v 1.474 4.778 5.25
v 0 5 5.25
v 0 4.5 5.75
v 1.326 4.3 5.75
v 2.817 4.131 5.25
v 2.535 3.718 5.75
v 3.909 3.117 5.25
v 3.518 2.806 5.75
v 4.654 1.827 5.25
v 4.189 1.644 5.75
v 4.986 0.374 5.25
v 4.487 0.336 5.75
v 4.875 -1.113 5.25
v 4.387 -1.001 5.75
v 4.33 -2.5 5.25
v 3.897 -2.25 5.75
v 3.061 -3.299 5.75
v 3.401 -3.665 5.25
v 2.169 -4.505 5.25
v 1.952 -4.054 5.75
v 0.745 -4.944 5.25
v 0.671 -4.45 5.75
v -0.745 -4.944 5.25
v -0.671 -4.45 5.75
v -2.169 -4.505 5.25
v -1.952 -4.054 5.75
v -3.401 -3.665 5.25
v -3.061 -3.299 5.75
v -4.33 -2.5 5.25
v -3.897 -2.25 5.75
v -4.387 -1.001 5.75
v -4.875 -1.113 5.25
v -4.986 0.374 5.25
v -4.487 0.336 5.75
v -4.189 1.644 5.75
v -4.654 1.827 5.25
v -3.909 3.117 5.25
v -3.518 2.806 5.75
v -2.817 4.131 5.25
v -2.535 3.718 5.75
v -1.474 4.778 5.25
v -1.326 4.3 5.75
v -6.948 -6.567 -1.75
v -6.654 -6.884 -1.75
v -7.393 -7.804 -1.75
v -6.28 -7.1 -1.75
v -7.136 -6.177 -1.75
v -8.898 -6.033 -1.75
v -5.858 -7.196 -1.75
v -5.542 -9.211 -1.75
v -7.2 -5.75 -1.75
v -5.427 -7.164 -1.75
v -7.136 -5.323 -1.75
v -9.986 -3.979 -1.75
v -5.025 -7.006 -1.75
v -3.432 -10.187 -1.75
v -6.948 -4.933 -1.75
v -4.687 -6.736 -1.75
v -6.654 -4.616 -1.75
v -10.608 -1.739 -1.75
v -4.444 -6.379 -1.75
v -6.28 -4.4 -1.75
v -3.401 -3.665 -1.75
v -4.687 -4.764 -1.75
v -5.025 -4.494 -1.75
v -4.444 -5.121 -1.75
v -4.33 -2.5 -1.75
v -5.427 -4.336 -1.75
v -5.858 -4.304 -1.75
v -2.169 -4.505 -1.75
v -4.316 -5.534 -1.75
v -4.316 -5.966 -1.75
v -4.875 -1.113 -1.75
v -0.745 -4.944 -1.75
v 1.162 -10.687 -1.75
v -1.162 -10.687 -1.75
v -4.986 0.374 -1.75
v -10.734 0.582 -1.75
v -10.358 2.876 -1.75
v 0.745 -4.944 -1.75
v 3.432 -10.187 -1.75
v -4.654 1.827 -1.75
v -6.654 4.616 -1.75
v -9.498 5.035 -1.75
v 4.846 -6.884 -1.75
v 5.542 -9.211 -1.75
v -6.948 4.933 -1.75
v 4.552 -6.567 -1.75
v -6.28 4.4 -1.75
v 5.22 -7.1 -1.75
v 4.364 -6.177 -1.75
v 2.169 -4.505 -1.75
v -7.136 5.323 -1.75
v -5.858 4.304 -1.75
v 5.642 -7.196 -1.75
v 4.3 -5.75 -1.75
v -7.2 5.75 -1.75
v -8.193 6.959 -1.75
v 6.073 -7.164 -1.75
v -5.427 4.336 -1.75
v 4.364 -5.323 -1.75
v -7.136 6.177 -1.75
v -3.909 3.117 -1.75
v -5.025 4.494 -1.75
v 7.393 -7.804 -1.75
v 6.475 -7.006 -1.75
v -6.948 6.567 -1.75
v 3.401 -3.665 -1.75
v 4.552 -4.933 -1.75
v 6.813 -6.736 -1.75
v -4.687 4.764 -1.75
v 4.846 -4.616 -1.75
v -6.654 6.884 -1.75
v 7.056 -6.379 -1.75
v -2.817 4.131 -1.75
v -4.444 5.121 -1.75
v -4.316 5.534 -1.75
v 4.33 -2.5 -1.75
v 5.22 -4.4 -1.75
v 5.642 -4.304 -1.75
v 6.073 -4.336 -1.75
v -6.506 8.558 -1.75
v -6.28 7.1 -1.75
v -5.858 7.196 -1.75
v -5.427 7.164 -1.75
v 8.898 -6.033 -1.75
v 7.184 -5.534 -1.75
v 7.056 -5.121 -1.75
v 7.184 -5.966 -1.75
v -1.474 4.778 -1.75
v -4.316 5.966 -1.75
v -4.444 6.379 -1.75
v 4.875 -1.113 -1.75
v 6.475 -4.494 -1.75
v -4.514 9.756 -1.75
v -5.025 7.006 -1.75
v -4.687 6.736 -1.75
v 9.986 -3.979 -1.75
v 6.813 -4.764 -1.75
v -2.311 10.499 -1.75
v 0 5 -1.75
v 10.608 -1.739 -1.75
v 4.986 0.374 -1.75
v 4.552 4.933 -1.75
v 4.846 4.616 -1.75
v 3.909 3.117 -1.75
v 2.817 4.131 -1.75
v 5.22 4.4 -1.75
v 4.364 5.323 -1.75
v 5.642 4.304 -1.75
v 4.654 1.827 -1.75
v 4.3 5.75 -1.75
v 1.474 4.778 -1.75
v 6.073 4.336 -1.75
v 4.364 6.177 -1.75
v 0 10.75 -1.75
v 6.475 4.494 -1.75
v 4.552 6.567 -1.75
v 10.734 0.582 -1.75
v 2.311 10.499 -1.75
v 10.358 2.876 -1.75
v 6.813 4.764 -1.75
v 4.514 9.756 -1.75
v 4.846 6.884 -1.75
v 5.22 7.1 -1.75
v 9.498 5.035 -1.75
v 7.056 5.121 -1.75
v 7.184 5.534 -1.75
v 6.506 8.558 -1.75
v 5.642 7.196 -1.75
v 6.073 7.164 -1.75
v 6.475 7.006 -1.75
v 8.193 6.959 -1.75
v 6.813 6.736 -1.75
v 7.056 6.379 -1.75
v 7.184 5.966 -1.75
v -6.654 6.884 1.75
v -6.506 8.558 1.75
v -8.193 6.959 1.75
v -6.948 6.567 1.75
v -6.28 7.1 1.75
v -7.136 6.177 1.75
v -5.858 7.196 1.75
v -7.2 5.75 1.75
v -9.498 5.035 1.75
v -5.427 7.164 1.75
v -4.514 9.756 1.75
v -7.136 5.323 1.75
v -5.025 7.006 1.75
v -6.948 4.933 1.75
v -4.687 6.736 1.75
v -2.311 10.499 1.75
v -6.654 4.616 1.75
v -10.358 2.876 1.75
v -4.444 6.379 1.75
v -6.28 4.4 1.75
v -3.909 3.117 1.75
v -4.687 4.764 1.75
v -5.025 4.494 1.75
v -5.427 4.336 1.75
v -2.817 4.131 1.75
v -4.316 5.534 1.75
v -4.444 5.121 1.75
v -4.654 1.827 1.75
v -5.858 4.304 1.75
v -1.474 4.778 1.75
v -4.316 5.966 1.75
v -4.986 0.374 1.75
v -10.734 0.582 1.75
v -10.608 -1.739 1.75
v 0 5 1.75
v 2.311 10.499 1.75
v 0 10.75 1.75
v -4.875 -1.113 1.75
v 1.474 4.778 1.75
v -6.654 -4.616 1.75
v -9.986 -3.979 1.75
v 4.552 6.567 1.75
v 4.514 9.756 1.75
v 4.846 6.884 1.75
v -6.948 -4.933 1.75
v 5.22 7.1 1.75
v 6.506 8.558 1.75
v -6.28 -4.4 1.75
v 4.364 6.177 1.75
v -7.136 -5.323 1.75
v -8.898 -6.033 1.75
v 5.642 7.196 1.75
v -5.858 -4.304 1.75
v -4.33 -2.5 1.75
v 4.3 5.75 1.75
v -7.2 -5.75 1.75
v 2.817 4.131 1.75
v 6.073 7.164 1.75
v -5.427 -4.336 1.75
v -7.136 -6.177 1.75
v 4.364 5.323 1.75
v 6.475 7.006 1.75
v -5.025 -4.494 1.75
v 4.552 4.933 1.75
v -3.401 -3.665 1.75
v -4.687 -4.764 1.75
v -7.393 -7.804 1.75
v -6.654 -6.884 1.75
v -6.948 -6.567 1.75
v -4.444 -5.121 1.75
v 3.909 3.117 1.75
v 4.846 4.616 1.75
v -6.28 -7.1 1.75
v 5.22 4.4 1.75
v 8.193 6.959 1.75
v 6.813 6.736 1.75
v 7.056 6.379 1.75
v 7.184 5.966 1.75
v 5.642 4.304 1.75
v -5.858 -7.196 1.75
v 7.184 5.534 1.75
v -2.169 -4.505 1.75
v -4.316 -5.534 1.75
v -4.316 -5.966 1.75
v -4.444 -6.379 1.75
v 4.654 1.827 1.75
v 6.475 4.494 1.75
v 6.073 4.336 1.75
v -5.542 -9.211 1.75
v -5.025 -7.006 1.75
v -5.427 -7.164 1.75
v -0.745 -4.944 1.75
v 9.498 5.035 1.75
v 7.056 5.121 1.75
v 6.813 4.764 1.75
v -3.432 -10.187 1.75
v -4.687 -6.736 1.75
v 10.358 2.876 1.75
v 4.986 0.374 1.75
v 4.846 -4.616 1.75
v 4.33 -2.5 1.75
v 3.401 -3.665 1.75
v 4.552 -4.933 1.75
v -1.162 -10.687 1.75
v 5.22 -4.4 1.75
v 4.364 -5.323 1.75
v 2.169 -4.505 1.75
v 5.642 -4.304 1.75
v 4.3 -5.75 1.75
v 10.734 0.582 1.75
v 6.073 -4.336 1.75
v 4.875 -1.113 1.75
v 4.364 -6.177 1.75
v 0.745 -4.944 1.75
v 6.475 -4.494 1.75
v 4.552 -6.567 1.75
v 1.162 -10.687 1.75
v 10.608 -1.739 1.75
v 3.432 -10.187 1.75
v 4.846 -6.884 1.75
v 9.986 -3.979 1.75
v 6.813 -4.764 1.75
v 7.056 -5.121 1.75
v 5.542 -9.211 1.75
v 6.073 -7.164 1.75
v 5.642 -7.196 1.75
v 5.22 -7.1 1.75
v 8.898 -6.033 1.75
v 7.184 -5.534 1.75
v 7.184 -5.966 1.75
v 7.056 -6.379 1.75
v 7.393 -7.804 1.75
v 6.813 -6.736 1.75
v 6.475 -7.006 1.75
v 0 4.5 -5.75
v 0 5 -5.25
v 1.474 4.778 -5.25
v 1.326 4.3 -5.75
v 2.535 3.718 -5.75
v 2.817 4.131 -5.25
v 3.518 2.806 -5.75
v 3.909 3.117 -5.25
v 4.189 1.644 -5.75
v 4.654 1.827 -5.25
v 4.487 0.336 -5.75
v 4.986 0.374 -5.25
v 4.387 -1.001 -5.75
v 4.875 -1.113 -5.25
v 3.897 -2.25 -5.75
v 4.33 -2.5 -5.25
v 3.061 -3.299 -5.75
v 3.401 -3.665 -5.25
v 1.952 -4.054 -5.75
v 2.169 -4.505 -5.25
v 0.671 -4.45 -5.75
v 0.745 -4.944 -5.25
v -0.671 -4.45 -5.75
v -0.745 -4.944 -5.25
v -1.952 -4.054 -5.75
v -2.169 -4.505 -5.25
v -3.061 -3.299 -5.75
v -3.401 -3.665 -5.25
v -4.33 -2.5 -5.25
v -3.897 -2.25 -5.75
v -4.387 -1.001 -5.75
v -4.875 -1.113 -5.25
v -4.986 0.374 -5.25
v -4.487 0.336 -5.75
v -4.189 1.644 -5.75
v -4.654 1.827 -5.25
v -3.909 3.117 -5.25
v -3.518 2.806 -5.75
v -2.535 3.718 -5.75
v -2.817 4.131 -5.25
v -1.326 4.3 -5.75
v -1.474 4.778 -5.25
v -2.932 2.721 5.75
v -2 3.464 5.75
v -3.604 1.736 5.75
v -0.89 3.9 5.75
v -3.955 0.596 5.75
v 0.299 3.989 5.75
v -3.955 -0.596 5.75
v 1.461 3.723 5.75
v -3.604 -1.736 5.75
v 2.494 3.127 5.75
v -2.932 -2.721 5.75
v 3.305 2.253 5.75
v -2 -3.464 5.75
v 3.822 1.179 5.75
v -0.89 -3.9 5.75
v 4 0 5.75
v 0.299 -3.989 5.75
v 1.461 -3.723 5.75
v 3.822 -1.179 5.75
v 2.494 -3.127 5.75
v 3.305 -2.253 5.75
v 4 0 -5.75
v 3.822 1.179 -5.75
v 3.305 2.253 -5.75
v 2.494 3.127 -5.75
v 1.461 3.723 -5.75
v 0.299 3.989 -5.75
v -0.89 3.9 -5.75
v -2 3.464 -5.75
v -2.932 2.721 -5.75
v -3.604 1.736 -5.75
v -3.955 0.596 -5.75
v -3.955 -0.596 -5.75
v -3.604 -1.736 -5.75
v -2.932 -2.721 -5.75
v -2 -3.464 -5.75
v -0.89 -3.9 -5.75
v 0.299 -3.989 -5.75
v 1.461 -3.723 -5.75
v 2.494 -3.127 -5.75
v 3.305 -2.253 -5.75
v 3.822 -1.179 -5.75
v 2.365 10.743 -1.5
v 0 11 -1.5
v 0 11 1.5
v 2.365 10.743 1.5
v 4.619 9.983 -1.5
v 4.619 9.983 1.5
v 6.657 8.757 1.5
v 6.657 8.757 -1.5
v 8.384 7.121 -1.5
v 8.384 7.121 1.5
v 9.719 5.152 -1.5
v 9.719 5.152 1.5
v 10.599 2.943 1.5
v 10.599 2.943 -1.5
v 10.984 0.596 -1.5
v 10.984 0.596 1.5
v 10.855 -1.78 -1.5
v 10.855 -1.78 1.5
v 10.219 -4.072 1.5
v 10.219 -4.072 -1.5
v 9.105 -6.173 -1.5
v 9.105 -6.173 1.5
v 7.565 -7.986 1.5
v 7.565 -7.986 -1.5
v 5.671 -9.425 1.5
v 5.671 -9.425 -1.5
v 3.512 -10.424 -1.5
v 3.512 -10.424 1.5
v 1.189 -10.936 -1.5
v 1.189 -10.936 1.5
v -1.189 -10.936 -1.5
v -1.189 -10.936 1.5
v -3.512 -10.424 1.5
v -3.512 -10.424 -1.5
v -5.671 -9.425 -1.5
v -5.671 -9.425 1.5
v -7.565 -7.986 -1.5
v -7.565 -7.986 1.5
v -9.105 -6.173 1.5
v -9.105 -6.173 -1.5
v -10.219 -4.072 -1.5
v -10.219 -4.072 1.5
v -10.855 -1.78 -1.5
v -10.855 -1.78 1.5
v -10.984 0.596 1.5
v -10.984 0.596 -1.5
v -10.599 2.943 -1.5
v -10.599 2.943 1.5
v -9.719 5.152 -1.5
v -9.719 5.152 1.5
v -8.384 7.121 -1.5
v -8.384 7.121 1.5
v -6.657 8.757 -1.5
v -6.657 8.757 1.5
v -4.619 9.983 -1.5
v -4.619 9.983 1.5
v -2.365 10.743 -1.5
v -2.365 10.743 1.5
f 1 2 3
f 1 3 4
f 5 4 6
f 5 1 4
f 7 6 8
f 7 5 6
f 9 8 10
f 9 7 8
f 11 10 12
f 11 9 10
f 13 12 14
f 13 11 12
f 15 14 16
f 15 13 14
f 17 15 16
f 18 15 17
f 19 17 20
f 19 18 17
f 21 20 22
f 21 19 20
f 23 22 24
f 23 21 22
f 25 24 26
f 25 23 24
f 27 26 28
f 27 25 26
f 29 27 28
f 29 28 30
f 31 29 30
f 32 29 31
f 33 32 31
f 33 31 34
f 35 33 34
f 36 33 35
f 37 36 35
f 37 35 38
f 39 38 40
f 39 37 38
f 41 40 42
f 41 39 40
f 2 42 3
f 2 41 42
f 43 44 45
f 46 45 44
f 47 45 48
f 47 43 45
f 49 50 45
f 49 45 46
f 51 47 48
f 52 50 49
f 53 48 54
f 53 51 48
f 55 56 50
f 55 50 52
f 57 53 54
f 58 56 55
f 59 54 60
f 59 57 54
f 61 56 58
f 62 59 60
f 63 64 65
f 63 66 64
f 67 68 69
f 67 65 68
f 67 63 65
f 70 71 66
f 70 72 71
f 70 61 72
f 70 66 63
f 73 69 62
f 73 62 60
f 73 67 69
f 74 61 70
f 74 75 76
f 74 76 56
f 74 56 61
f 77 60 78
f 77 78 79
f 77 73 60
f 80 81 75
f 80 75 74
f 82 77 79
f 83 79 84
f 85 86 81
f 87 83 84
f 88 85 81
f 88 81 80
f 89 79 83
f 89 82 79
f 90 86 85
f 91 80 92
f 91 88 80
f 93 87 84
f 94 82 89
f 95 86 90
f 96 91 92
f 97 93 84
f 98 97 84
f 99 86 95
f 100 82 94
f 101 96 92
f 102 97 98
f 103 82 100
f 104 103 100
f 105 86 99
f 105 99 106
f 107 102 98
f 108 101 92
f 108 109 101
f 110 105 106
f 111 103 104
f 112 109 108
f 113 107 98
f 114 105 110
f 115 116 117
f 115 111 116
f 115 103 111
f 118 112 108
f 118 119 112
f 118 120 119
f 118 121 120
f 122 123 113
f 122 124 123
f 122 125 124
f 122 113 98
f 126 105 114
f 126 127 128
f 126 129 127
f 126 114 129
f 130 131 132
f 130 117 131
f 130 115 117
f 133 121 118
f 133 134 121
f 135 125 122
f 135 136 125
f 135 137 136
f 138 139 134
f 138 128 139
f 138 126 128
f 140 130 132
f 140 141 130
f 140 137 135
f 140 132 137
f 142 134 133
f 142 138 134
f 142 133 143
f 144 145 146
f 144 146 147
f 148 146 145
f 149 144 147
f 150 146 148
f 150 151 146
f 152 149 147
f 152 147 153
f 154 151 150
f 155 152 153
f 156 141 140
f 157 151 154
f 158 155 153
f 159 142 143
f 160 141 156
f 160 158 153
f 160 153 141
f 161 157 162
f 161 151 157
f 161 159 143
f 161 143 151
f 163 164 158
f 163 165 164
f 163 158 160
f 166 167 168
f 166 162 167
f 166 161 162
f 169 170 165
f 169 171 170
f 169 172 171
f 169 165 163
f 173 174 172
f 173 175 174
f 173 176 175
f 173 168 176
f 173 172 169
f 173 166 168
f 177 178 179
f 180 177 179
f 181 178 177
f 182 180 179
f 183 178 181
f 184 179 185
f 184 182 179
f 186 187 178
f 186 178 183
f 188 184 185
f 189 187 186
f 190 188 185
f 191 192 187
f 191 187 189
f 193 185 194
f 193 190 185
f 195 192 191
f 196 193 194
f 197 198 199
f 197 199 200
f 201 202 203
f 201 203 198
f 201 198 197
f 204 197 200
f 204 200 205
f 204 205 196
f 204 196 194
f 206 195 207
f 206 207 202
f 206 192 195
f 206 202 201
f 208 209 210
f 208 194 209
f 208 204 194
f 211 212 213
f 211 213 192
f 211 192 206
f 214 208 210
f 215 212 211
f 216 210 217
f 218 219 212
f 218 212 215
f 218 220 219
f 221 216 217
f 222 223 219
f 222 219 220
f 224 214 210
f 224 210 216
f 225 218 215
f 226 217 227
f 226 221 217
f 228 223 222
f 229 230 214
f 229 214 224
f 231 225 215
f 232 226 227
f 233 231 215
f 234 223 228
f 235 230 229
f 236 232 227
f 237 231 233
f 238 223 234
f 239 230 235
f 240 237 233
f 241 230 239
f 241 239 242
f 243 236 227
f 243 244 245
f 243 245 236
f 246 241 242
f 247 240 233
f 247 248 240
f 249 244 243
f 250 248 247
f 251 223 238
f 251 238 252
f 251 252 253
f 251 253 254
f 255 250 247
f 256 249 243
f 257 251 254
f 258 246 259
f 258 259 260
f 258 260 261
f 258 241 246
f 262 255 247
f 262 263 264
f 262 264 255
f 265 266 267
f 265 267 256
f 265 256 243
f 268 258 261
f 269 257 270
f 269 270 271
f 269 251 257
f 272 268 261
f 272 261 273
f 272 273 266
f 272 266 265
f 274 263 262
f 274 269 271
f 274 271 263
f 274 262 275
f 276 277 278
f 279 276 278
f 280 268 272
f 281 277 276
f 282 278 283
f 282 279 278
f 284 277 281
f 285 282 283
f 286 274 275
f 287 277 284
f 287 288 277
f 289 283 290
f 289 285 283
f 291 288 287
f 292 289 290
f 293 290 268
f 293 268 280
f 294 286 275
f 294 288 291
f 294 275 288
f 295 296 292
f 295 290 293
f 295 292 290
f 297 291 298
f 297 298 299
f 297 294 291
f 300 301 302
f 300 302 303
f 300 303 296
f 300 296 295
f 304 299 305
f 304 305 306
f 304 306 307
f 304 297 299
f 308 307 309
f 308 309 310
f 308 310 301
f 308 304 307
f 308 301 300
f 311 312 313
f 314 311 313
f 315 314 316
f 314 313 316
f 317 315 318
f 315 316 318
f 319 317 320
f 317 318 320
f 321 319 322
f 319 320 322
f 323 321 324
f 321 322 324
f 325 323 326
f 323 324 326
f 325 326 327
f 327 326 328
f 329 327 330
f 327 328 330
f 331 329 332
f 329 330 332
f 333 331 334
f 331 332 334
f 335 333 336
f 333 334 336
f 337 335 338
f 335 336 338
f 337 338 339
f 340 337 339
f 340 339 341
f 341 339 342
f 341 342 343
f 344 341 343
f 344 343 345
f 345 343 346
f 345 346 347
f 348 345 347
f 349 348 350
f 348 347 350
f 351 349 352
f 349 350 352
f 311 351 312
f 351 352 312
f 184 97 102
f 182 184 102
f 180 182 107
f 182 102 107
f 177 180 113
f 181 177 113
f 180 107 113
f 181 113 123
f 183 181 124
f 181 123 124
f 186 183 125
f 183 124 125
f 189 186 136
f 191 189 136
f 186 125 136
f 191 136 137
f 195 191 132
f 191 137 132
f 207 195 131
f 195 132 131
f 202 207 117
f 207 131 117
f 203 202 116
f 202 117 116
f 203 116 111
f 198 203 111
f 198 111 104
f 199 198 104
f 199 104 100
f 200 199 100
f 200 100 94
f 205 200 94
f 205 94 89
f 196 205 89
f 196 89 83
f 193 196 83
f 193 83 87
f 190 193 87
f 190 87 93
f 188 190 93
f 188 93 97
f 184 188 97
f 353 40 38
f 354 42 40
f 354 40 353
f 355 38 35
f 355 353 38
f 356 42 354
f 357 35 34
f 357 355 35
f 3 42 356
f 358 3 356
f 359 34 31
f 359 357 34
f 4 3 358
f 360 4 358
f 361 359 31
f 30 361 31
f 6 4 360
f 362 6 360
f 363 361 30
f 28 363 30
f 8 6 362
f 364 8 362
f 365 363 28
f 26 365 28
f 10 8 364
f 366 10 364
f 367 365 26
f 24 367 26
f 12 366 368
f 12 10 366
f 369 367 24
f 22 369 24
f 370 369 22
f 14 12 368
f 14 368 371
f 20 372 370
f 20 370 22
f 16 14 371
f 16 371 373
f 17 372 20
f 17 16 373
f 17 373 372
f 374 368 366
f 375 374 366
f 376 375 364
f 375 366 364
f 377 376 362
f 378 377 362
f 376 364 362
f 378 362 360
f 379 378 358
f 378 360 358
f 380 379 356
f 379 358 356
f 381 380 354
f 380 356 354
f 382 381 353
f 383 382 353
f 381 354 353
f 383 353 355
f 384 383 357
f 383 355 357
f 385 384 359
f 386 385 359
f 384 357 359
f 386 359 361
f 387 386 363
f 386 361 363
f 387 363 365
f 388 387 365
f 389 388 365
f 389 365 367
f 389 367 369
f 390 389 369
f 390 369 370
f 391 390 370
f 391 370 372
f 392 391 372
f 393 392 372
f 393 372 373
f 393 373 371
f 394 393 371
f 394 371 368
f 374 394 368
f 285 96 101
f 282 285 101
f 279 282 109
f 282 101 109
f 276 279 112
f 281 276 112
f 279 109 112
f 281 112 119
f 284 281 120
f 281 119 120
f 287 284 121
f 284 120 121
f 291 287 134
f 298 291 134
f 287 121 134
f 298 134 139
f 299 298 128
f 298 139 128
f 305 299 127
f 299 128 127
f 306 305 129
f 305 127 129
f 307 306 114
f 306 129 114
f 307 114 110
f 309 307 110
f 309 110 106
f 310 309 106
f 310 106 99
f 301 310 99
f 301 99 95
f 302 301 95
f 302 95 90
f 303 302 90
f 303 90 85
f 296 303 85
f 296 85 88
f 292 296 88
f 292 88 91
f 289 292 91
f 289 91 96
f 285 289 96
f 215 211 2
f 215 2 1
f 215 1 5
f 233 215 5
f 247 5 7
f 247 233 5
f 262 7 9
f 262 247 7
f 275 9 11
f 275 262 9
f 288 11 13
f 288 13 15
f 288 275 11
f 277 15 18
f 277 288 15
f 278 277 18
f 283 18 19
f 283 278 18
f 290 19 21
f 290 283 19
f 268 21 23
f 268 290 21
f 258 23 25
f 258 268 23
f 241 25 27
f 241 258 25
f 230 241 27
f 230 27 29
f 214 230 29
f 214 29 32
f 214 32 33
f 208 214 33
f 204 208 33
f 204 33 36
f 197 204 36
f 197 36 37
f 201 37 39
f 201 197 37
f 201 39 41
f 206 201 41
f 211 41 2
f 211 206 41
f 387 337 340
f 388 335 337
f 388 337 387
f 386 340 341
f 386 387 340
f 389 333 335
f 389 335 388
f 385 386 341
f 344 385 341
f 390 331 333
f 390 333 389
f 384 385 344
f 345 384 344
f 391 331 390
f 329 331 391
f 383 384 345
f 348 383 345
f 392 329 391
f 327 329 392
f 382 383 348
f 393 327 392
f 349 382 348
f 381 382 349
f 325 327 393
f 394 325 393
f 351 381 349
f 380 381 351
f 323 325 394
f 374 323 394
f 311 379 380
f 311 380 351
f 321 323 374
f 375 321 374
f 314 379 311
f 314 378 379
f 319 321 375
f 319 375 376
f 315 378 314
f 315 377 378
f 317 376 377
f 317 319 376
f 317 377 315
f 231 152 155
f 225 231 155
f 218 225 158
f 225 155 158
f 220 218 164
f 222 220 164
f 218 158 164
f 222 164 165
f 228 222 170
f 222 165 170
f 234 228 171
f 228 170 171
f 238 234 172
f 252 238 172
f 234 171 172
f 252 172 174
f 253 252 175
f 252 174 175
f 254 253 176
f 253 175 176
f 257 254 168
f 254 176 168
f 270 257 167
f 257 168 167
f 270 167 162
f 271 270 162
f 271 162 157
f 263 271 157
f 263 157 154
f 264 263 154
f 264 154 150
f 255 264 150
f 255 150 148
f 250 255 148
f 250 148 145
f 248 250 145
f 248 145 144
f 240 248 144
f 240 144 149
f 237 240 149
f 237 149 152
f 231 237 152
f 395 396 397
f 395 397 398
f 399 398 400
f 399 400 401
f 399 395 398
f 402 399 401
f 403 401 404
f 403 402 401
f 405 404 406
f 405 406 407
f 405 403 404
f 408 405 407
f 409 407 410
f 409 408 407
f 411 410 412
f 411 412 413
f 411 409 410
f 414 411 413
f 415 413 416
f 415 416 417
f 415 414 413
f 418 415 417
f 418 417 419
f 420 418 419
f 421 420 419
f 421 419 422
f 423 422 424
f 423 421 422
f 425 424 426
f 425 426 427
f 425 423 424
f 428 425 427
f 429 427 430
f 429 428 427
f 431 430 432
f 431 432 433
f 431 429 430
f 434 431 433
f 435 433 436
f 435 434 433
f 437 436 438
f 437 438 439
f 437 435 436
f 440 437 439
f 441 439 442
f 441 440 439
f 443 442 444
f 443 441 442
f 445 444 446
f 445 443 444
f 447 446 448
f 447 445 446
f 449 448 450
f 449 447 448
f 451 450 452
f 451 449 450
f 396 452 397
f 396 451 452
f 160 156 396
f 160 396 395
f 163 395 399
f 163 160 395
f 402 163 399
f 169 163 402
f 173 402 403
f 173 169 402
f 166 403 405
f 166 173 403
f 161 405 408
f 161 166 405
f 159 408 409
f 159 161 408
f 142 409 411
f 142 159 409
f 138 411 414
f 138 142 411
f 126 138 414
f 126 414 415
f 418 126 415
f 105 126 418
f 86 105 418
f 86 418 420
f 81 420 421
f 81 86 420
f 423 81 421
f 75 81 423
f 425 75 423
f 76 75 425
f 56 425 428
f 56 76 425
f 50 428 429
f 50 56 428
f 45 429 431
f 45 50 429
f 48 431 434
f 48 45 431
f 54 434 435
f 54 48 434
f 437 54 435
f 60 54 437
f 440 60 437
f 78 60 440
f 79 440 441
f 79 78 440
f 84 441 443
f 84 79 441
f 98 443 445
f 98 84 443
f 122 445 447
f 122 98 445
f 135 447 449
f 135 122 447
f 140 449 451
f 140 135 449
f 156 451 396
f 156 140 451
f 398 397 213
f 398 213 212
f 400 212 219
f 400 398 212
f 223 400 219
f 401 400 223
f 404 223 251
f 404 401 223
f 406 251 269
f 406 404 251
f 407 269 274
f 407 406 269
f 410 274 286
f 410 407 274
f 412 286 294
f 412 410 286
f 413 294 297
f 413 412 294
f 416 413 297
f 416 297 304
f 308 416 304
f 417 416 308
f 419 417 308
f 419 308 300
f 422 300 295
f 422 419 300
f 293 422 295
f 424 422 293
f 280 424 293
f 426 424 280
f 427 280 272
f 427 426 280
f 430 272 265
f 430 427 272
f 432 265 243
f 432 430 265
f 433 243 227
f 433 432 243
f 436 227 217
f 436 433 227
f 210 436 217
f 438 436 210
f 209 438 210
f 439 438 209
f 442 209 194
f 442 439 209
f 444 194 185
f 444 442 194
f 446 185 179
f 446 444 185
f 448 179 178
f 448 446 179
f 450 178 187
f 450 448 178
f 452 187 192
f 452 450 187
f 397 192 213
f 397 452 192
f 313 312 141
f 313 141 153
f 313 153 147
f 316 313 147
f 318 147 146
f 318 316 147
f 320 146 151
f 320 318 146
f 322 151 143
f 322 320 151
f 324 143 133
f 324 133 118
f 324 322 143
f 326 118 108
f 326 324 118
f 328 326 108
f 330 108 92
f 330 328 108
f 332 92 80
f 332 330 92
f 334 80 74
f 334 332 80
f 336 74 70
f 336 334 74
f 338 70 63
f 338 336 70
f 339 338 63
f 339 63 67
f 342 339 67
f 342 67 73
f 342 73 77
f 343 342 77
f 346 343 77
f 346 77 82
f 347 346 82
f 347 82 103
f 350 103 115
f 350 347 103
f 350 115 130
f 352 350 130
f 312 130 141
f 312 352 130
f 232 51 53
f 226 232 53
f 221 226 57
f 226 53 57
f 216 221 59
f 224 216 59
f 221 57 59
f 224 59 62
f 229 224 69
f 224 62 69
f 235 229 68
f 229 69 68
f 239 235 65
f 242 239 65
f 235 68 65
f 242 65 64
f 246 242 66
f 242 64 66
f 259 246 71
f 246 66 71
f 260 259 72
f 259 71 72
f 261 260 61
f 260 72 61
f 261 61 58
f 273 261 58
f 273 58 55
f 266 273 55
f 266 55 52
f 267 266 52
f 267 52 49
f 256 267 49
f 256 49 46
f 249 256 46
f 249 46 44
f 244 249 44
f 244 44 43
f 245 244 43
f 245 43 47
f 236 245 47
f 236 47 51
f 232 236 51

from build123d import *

# Parameters (mm, degrees)
SKETCH2_R               = 4
CUT_EXTRUDE1_DEPTH      = 12.5
CHAMFER1_SIZE           = 0.5
CHAMFER2_SIZE           = 0.25
M3_5X0_6_TAPPED_HOLE1_D = 2.9


with BuildPart() as part:
    # Sketch1 → Revolve1 (revolve)
    with BuildSketch(Plane(origin=(0, 0, 0), x_dir=(0, 0, -1), z_dir=(1, 0, 0))):
        Polygon((-5.75, 0), (-5.75, 5), (-1.75, 5), (-1.75, 11), (1.75, 11), (1.75, 5), (5.75, 5), (5.75, 0), align=None)
    revolve(axis=Axis((0, 0, 5.75), (0, 0, -1)))

    # Sketch2 → Cut-Extrude1 (cut, through all)
    with BuildSketch(Plane.XY.offset(5.75)):
        Circle(SKETCH2_R)
    extrude(amount=-CUT_EXTRUDE1_DEPTH, mode=Mode.SUBTRACT)

    # Chamfer1
    chamfer1_edges = [part.edges().sort_by_distance(p)[0] for p in [
        (0, -5, -5.75),
        (0, -5, 5.75),
    ]]
    chamfer(chamfer1_edges, length=CHAMFER1_SIZE)

    # Chamfer2
    chamfer2_edges = [part.edges().sort_by_distance(p)[0] for p in [
        (0, -11, -1.75),
        (0, -11, 1.75),
    ]]
    chamfer(chamfer2_edges, length=CHAMFER2_SIZE)

    # M3.5x0.6 Tapped Hole1 (through all)
    with Locations(Plane.XY.offset(1.75)):
        with Locations((-5.75, 5.75), (5.75, 5.75), (5.75, -5.75), (-5.75, -5.75)):
            Hole(M3_5X0_6_TAPPED_HOLE1_D / 2)


solid = part.part
